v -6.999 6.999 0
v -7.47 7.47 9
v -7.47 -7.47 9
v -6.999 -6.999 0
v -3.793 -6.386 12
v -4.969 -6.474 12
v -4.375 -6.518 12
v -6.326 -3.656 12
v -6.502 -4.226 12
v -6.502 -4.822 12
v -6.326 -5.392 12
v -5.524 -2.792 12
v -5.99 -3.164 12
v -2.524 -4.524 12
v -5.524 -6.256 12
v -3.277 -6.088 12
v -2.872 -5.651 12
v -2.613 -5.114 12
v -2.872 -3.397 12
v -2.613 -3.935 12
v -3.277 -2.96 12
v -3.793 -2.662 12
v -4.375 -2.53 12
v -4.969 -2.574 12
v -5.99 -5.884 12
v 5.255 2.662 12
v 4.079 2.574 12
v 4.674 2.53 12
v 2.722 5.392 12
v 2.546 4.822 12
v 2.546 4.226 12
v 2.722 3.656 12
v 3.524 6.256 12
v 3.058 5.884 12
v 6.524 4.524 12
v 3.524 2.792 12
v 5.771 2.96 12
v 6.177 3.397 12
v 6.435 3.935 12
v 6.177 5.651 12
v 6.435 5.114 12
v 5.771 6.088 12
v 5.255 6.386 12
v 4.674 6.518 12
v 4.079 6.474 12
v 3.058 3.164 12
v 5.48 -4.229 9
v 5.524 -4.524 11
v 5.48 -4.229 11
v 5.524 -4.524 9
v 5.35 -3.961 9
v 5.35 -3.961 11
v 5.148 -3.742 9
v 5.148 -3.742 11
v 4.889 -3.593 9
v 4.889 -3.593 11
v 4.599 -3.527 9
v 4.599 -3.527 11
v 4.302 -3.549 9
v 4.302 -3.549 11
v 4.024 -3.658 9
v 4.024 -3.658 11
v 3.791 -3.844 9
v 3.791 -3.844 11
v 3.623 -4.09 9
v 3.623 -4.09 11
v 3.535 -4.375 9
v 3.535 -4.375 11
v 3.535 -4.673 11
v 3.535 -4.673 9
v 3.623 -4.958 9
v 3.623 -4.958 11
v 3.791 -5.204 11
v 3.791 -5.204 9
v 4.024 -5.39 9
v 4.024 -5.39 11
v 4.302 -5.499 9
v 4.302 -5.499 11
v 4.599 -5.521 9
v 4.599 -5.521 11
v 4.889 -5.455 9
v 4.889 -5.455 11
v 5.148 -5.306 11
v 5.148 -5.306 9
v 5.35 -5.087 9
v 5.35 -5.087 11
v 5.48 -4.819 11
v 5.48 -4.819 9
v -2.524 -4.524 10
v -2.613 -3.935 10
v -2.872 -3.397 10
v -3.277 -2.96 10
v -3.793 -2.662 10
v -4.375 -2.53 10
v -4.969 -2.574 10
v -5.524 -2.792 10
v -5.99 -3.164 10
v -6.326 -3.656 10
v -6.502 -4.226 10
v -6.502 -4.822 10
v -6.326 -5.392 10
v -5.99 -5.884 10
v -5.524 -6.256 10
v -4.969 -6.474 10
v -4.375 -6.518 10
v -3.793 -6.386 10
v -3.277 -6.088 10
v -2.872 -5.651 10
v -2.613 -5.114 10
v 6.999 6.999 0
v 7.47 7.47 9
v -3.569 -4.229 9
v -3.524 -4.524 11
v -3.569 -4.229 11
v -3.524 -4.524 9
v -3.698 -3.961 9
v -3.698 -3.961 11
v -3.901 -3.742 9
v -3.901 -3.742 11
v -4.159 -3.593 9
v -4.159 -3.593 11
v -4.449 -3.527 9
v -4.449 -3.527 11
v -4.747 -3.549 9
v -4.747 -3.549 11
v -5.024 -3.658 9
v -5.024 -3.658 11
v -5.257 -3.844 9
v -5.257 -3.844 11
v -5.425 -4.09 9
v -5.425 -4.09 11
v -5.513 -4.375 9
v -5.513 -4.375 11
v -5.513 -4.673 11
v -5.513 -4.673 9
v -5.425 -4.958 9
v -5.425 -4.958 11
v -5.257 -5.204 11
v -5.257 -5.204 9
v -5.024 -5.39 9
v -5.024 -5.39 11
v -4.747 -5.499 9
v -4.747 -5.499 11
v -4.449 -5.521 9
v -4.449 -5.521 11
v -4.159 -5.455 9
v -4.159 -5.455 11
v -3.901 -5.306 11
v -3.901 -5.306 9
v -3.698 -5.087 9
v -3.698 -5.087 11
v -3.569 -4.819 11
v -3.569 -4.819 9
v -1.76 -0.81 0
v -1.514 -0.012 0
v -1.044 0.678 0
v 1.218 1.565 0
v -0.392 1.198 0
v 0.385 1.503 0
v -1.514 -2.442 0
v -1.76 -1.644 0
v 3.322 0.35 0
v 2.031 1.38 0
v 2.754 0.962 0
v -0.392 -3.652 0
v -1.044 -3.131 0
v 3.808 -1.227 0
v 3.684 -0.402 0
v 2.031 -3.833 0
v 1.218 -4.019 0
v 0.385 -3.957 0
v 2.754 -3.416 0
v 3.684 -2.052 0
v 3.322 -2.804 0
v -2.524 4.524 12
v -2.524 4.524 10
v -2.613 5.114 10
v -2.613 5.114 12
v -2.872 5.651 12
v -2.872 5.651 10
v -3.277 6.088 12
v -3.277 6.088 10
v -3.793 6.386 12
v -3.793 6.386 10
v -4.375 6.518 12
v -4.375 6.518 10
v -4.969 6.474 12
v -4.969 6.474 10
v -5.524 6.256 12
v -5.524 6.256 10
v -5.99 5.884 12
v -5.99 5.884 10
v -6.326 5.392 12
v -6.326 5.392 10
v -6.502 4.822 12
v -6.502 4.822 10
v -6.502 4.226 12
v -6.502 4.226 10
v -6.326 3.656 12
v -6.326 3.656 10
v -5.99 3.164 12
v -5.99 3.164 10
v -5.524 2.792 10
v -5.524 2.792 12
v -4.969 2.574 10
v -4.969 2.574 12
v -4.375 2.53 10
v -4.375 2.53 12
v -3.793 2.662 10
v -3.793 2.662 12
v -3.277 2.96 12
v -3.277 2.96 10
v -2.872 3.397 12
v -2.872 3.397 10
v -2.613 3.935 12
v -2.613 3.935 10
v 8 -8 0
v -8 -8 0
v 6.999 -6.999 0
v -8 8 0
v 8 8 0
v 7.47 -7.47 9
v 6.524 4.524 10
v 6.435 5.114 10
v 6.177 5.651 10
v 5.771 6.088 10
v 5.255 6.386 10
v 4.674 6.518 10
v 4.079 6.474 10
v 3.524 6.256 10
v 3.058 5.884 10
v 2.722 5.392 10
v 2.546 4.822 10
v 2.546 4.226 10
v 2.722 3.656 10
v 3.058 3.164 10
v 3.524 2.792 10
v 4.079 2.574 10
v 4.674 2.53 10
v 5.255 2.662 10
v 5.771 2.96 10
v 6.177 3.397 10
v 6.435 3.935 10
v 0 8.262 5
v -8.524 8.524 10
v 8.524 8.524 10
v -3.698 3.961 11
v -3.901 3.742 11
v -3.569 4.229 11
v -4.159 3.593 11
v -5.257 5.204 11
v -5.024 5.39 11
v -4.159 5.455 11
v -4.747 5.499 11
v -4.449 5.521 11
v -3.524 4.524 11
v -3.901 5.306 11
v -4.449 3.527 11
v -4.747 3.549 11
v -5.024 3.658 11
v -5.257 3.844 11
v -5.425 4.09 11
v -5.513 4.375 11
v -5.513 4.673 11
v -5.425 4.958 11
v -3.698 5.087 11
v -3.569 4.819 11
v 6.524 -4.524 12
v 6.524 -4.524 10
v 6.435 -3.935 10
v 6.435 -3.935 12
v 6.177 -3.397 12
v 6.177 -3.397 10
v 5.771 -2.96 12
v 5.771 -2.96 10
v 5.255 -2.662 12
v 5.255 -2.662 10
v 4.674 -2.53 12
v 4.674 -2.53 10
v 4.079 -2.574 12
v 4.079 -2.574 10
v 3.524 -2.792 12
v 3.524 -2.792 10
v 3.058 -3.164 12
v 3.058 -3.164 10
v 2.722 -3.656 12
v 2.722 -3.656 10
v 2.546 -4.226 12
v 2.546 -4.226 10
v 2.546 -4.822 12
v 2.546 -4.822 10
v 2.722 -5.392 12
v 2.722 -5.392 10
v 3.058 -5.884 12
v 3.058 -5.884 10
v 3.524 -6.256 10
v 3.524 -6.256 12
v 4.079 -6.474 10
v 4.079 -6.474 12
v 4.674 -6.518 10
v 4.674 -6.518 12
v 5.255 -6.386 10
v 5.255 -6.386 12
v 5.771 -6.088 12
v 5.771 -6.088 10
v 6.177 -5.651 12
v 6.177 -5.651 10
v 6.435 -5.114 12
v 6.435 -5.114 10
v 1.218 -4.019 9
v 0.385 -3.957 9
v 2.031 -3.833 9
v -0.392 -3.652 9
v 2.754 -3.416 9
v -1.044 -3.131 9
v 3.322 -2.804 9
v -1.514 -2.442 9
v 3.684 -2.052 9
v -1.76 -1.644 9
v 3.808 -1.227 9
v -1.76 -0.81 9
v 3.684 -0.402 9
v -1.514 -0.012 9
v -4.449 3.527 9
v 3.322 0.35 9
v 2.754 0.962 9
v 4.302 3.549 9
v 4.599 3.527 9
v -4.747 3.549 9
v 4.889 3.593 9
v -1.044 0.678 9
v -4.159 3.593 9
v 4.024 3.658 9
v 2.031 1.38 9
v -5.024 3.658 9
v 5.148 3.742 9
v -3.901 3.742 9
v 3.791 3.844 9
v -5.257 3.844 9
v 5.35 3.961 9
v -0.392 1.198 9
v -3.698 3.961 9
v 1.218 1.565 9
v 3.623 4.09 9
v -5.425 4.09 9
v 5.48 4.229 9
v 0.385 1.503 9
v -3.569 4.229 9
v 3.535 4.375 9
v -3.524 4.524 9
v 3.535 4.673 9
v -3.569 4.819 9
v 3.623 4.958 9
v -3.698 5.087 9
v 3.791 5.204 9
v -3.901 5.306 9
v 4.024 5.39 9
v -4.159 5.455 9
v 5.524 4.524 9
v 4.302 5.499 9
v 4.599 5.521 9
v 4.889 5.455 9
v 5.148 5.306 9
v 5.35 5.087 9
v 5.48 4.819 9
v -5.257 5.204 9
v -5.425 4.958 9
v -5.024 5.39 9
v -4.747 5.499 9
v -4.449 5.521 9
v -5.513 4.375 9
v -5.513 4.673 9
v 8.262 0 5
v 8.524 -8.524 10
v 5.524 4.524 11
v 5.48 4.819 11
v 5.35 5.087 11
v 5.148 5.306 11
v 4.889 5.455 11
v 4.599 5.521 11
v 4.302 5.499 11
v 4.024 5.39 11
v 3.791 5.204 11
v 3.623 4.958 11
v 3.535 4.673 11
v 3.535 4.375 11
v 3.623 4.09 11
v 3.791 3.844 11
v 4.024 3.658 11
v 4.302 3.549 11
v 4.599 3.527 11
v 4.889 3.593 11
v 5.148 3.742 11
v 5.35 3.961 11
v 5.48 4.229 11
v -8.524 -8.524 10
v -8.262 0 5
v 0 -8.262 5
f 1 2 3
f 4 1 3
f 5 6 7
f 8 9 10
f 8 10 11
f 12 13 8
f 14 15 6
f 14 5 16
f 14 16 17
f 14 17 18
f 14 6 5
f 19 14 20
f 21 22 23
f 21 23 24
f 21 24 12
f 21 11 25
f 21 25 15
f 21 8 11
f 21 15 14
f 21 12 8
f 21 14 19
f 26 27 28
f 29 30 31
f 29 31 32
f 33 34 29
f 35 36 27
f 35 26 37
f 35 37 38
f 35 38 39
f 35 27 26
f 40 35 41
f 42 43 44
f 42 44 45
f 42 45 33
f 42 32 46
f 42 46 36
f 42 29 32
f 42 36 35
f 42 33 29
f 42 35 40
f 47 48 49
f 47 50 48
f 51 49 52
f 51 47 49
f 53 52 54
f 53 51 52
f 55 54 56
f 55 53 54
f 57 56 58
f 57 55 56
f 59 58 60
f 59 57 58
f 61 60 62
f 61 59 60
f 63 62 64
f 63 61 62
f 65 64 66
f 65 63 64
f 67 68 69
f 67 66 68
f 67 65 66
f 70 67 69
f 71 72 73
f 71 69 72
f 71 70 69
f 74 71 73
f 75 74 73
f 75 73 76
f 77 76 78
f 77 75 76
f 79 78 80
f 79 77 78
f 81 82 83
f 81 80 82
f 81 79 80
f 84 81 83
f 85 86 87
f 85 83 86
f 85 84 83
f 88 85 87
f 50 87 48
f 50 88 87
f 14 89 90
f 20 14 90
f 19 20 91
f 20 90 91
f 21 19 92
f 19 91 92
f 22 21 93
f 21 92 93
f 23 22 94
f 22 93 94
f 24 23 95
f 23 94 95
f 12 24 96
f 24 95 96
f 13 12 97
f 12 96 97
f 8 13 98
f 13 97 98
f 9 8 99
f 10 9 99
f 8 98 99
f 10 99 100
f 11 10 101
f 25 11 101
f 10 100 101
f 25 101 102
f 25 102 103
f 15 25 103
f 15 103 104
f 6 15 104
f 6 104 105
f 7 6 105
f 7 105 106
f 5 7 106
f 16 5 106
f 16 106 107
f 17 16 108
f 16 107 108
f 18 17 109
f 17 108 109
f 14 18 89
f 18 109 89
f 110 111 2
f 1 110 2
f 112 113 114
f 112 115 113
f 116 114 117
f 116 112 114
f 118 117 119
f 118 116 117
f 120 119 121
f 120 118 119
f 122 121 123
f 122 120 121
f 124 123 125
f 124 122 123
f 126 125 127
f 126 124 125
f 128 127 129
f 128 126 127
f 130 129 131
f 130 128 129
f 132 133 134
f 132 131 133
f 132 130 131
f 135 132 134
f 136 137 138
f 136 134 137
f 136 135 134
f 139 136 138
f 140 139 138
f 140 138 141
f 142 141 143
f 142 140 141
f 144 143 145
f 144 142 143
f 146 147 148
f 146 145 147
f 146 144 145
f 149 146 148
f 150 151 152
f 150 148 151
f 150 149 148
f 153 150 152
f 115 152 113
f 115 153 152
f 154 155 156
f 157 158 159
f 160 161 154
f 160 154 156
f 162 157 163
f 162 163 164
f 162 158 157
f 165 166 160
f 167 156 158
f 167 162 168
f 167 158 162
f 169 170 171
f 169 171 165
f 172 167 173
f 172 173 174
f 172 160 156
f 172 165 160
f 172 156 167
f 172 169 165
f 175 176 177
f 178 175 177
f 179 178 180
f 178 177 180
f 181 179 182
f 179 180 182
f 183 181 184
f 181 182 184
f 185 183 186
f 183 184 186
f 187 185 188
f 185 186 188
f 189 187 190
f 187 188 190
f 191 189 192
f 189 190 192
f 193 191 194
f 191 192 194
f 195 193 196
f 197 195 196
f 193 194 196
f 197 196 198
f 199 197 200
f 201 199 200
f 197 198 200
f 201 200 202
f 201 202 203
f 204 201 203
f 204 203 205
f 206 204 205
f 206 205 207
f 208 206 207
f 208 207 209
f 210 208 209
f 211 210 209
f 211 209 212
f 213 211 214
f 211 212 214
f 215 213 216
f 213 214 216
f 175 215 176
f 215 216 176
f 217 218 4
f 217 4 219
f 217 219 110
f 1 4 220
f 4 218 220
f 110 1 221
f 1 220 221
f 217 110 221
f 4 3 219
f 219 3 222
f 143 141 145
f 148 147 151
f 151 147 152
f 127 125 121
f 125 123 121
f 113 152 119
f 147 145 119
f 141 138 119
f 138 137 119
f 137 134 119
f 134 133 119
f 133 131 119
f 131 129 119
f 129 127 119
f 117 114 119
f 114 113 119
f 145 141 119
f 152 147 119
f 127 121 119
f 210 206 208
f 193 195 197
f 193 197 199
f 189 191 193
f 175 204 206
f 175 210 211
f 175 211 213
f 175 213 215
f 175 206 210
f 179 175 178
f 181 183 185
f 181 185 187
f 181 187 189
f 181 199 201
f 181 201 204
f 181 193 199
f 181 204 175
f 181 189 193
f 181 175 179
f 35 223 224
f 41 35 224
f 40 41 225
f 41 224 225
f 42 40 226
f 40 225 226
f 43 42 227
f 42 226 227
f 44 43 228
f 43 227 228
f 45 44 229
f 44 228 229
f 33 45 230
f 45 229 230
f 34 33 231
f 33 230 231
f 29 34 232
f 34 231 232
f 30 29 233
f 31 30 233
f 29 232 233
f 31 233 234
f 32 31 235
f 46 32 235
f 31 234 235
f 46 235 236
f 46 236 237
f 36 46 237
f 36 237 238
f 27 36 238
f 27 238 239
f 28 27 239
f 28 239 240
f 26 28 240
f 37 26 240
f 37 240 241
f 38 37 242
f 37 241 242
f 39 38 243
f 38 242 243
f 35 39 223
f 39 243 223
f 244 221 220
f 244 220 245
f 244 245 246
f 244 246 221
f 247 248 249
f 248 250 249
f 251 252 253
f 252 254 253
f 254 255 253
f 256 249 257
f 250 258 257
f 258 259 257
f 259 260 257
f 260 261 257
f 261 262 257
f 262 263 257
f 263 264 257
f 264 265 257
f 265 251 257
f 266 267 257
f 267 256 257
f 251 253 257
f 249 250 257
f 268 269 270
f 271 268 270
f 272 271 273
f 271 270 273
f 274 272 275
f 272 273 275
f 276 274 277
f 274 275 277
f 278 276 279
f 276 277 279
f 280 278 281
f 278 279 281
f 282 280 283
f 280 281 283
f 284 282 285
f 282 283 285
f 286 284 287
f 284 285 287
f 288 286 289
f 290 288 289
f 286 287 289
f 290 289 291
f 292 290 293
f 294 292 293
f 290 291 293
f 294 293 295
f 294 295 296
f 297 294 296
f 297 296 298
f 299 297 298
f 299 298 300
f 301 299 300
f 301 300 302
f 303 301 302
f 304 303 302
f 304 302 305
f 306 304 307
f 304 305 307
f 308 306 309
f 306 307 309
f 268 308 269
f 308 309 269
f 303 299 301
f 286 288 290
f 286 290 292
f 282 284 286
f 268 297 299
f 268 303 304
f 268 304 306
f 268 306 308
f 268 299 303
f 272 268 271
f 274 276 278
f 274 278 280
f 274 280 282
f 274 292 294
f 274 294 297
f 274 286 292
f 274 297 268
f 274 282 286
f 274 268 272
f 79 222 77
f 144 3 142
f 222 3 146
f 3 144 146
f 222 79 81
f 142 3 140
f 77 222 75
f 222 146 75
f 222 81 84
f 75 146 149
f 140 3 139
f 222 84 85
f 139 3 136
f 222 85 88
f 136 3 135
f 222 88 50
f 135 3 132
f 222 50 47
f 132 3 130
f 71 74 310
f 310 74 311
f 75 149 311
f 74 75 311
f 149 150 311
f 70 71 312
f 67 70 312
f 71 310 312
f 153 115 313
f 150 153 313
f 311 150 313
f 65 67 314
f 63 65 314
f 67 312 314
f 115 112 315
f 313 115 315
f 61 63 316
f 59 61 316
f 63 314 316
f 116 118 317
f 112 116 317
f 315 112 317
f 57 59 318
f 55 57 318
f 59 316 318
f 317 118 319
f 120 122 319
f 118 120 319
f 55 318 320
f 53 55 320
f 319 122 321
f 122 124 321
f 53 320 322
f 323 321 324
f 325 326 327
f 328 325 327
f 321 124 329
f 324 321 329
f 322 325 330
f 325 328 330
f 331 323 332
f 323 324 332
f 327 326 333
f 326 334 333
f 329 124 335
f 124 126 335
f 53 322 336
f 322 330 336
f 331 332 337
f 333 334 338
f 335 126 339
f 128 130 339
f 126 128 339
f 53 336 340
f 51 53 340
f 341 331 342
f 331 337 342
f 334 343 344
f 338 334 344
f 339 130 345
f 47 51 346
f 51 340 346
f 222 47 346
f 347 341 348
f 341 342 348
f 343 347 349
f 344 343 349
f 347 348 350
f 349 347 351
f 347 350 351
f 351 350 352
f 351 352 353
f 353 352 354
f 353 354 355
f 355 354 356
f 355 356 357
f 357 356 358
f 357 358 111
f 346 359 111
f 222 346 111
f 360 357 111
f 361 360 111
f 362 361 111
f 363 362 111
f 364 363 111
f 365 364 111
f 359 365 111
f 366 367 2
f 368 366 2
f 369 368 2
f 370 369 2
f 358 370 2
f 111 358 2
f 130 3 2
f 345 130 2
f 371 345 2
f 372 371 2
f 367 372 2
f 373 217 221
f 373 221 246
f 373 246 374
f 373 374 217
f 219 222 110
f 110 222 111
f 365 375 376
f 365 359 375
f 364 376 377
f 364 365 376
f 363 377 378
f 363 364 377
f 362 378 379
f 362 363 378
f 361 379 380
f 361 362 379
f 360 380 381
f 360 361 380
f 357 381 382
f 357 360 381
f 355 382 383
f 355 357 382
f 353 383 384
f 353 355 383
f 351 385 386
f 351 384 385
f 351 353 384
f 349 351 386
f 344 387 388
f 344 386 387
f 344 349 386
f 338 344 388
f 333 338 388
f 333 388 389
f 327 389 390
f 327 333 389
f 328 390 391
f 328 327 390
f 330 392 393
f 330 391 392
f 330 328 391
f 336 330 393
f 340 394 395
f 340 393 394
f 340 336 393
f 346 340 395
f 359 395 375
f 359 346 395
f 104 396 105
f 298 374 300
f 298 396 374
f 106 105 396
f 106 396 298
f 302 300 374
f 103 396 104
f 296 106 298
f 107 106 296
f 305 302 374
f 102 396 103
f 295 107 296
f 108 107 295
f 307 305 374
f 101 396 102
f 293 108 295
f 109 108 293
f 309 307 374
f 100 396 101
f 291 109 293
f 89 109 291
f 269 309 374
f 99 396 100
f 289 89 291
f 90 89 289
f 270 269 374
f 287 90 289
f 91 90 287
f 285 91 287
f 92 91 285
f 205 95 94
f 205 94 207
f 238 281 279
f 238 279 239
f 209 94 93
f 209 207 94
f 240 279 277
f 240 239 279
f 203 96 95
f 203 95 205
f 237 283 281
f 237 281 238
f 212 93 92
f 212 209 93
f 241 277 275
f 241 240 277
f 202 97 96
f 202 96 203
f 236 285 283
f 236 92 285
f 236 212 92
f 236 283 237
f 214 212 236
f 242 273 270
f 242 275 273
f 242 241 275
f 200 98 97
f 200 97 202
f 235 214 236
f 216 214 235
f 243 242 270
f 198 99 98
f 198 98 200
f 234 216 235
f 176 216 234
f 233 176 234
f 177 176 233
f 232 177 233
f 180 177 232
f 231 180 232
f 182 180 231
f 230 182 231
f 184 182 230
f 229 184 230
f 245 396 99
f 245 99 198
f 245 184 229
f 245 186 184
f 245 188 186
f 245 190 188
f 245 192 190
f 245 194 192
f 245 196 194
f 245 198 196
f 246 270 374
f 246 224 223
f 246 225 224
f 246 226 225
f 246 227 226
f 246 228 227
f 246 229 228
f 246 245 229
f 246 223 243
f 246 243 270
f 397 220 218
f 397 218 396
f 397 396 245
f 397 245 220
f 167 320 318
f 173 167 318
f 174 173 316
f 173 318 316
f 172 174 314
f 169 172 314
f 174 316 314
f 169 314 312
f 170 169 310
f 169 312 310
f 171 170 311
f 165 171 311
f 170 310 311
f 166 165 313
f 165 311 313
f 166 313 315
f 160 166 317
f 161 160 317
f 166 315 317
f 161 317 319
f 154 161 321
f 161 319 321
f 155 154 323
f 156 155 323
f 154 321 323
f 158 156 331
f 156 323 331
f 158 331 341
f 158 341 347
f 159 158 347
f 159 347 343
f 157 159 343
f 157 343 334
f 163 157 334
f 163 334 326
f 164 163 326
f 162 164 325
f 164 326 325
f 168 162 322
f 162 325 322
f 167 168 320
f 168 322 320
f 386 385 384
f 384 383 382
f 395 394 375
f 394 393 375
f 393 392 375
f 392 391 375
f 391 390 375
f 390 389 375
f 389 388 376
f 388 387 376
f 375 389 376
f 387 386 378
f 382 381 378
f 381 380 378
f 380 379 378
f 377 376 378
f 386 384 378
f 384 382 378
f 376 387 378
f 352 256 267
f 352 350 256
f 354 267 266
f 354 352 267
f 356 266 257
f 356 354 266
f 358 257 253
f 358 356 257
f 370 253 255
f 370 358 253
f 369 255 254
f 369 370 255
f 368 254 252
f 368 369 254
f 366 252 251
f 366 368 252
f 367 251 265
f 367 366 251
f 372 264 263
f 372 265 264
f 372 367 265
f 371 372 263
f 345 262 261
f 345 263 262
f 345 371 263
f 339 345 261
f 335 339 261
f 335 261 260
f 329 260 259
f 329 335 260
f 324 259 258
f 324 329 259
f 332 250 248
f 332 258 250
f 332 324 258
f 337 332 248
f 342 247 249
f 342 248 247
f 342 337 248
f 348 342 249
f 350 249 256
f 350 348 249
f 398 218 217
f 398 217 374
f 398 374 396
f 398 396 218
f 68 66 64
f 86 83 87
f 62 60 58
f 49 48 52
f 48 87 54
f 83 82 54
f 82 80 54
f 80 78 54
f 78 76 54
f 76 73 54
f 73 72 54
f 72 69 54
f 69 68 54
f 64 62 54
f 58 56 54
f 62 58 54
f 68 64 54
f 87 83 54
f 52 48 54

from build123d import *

# Parameters (mm, degrees)
F0_W     = 16
F0_H     = 16
F1_DEPTH = 10
F1_TAPER = -3
F2_R     = 2
F3_DEPTH = 2
F4_T     = -1
F5_R     = 2.8
F6_DEPTH = 9


with BuildPart() as f1:
    # F0 (on Top) → F1 (new body)
    with BuildSketch(Plane.XY):
        Rectangle(F0_W, F0_H)
    extrude(amount=F1_DEPTH, taper=F1_TAPER)

    # F2 (on face) → F3 (join)
    with BuildSketch(Plane.XY.offset(10)):
        with Locations((-4.5240777928, 4.5240777928)):
            Circle(F2_R)
        with Locations((4.5240777928, 4.5240777928)):
            Circle(F2_R)
        with Locations((4.5240777928, -4.5240777928)):
            Circle(F2_R)
        with Locations((-4.5240777928, -4.5240777928)):
            Circle(F2_R)
    extrude(amount=F3_DEPTH)

    # F4
    f4_openings = [f1.faces().sort_by_distance(p)[0] for p in [
        (0, 0, 0),
    ]]
    offset(amount=F4_T, openings=f4_openings, kind=Kind.INTERSECTION)

    # F5 (on face) → F6 (join)
    with BuildSketch(Plane(origin=(0, 0, 9), x_dir=(1, 0, 0), z_dir=(0, 0, -1))):
        with Locations((1.0082904482, 1.2269222643)):
            Circle(F5_R)
    extrude(amount=F6_DEPTH)


solid = f1.part
